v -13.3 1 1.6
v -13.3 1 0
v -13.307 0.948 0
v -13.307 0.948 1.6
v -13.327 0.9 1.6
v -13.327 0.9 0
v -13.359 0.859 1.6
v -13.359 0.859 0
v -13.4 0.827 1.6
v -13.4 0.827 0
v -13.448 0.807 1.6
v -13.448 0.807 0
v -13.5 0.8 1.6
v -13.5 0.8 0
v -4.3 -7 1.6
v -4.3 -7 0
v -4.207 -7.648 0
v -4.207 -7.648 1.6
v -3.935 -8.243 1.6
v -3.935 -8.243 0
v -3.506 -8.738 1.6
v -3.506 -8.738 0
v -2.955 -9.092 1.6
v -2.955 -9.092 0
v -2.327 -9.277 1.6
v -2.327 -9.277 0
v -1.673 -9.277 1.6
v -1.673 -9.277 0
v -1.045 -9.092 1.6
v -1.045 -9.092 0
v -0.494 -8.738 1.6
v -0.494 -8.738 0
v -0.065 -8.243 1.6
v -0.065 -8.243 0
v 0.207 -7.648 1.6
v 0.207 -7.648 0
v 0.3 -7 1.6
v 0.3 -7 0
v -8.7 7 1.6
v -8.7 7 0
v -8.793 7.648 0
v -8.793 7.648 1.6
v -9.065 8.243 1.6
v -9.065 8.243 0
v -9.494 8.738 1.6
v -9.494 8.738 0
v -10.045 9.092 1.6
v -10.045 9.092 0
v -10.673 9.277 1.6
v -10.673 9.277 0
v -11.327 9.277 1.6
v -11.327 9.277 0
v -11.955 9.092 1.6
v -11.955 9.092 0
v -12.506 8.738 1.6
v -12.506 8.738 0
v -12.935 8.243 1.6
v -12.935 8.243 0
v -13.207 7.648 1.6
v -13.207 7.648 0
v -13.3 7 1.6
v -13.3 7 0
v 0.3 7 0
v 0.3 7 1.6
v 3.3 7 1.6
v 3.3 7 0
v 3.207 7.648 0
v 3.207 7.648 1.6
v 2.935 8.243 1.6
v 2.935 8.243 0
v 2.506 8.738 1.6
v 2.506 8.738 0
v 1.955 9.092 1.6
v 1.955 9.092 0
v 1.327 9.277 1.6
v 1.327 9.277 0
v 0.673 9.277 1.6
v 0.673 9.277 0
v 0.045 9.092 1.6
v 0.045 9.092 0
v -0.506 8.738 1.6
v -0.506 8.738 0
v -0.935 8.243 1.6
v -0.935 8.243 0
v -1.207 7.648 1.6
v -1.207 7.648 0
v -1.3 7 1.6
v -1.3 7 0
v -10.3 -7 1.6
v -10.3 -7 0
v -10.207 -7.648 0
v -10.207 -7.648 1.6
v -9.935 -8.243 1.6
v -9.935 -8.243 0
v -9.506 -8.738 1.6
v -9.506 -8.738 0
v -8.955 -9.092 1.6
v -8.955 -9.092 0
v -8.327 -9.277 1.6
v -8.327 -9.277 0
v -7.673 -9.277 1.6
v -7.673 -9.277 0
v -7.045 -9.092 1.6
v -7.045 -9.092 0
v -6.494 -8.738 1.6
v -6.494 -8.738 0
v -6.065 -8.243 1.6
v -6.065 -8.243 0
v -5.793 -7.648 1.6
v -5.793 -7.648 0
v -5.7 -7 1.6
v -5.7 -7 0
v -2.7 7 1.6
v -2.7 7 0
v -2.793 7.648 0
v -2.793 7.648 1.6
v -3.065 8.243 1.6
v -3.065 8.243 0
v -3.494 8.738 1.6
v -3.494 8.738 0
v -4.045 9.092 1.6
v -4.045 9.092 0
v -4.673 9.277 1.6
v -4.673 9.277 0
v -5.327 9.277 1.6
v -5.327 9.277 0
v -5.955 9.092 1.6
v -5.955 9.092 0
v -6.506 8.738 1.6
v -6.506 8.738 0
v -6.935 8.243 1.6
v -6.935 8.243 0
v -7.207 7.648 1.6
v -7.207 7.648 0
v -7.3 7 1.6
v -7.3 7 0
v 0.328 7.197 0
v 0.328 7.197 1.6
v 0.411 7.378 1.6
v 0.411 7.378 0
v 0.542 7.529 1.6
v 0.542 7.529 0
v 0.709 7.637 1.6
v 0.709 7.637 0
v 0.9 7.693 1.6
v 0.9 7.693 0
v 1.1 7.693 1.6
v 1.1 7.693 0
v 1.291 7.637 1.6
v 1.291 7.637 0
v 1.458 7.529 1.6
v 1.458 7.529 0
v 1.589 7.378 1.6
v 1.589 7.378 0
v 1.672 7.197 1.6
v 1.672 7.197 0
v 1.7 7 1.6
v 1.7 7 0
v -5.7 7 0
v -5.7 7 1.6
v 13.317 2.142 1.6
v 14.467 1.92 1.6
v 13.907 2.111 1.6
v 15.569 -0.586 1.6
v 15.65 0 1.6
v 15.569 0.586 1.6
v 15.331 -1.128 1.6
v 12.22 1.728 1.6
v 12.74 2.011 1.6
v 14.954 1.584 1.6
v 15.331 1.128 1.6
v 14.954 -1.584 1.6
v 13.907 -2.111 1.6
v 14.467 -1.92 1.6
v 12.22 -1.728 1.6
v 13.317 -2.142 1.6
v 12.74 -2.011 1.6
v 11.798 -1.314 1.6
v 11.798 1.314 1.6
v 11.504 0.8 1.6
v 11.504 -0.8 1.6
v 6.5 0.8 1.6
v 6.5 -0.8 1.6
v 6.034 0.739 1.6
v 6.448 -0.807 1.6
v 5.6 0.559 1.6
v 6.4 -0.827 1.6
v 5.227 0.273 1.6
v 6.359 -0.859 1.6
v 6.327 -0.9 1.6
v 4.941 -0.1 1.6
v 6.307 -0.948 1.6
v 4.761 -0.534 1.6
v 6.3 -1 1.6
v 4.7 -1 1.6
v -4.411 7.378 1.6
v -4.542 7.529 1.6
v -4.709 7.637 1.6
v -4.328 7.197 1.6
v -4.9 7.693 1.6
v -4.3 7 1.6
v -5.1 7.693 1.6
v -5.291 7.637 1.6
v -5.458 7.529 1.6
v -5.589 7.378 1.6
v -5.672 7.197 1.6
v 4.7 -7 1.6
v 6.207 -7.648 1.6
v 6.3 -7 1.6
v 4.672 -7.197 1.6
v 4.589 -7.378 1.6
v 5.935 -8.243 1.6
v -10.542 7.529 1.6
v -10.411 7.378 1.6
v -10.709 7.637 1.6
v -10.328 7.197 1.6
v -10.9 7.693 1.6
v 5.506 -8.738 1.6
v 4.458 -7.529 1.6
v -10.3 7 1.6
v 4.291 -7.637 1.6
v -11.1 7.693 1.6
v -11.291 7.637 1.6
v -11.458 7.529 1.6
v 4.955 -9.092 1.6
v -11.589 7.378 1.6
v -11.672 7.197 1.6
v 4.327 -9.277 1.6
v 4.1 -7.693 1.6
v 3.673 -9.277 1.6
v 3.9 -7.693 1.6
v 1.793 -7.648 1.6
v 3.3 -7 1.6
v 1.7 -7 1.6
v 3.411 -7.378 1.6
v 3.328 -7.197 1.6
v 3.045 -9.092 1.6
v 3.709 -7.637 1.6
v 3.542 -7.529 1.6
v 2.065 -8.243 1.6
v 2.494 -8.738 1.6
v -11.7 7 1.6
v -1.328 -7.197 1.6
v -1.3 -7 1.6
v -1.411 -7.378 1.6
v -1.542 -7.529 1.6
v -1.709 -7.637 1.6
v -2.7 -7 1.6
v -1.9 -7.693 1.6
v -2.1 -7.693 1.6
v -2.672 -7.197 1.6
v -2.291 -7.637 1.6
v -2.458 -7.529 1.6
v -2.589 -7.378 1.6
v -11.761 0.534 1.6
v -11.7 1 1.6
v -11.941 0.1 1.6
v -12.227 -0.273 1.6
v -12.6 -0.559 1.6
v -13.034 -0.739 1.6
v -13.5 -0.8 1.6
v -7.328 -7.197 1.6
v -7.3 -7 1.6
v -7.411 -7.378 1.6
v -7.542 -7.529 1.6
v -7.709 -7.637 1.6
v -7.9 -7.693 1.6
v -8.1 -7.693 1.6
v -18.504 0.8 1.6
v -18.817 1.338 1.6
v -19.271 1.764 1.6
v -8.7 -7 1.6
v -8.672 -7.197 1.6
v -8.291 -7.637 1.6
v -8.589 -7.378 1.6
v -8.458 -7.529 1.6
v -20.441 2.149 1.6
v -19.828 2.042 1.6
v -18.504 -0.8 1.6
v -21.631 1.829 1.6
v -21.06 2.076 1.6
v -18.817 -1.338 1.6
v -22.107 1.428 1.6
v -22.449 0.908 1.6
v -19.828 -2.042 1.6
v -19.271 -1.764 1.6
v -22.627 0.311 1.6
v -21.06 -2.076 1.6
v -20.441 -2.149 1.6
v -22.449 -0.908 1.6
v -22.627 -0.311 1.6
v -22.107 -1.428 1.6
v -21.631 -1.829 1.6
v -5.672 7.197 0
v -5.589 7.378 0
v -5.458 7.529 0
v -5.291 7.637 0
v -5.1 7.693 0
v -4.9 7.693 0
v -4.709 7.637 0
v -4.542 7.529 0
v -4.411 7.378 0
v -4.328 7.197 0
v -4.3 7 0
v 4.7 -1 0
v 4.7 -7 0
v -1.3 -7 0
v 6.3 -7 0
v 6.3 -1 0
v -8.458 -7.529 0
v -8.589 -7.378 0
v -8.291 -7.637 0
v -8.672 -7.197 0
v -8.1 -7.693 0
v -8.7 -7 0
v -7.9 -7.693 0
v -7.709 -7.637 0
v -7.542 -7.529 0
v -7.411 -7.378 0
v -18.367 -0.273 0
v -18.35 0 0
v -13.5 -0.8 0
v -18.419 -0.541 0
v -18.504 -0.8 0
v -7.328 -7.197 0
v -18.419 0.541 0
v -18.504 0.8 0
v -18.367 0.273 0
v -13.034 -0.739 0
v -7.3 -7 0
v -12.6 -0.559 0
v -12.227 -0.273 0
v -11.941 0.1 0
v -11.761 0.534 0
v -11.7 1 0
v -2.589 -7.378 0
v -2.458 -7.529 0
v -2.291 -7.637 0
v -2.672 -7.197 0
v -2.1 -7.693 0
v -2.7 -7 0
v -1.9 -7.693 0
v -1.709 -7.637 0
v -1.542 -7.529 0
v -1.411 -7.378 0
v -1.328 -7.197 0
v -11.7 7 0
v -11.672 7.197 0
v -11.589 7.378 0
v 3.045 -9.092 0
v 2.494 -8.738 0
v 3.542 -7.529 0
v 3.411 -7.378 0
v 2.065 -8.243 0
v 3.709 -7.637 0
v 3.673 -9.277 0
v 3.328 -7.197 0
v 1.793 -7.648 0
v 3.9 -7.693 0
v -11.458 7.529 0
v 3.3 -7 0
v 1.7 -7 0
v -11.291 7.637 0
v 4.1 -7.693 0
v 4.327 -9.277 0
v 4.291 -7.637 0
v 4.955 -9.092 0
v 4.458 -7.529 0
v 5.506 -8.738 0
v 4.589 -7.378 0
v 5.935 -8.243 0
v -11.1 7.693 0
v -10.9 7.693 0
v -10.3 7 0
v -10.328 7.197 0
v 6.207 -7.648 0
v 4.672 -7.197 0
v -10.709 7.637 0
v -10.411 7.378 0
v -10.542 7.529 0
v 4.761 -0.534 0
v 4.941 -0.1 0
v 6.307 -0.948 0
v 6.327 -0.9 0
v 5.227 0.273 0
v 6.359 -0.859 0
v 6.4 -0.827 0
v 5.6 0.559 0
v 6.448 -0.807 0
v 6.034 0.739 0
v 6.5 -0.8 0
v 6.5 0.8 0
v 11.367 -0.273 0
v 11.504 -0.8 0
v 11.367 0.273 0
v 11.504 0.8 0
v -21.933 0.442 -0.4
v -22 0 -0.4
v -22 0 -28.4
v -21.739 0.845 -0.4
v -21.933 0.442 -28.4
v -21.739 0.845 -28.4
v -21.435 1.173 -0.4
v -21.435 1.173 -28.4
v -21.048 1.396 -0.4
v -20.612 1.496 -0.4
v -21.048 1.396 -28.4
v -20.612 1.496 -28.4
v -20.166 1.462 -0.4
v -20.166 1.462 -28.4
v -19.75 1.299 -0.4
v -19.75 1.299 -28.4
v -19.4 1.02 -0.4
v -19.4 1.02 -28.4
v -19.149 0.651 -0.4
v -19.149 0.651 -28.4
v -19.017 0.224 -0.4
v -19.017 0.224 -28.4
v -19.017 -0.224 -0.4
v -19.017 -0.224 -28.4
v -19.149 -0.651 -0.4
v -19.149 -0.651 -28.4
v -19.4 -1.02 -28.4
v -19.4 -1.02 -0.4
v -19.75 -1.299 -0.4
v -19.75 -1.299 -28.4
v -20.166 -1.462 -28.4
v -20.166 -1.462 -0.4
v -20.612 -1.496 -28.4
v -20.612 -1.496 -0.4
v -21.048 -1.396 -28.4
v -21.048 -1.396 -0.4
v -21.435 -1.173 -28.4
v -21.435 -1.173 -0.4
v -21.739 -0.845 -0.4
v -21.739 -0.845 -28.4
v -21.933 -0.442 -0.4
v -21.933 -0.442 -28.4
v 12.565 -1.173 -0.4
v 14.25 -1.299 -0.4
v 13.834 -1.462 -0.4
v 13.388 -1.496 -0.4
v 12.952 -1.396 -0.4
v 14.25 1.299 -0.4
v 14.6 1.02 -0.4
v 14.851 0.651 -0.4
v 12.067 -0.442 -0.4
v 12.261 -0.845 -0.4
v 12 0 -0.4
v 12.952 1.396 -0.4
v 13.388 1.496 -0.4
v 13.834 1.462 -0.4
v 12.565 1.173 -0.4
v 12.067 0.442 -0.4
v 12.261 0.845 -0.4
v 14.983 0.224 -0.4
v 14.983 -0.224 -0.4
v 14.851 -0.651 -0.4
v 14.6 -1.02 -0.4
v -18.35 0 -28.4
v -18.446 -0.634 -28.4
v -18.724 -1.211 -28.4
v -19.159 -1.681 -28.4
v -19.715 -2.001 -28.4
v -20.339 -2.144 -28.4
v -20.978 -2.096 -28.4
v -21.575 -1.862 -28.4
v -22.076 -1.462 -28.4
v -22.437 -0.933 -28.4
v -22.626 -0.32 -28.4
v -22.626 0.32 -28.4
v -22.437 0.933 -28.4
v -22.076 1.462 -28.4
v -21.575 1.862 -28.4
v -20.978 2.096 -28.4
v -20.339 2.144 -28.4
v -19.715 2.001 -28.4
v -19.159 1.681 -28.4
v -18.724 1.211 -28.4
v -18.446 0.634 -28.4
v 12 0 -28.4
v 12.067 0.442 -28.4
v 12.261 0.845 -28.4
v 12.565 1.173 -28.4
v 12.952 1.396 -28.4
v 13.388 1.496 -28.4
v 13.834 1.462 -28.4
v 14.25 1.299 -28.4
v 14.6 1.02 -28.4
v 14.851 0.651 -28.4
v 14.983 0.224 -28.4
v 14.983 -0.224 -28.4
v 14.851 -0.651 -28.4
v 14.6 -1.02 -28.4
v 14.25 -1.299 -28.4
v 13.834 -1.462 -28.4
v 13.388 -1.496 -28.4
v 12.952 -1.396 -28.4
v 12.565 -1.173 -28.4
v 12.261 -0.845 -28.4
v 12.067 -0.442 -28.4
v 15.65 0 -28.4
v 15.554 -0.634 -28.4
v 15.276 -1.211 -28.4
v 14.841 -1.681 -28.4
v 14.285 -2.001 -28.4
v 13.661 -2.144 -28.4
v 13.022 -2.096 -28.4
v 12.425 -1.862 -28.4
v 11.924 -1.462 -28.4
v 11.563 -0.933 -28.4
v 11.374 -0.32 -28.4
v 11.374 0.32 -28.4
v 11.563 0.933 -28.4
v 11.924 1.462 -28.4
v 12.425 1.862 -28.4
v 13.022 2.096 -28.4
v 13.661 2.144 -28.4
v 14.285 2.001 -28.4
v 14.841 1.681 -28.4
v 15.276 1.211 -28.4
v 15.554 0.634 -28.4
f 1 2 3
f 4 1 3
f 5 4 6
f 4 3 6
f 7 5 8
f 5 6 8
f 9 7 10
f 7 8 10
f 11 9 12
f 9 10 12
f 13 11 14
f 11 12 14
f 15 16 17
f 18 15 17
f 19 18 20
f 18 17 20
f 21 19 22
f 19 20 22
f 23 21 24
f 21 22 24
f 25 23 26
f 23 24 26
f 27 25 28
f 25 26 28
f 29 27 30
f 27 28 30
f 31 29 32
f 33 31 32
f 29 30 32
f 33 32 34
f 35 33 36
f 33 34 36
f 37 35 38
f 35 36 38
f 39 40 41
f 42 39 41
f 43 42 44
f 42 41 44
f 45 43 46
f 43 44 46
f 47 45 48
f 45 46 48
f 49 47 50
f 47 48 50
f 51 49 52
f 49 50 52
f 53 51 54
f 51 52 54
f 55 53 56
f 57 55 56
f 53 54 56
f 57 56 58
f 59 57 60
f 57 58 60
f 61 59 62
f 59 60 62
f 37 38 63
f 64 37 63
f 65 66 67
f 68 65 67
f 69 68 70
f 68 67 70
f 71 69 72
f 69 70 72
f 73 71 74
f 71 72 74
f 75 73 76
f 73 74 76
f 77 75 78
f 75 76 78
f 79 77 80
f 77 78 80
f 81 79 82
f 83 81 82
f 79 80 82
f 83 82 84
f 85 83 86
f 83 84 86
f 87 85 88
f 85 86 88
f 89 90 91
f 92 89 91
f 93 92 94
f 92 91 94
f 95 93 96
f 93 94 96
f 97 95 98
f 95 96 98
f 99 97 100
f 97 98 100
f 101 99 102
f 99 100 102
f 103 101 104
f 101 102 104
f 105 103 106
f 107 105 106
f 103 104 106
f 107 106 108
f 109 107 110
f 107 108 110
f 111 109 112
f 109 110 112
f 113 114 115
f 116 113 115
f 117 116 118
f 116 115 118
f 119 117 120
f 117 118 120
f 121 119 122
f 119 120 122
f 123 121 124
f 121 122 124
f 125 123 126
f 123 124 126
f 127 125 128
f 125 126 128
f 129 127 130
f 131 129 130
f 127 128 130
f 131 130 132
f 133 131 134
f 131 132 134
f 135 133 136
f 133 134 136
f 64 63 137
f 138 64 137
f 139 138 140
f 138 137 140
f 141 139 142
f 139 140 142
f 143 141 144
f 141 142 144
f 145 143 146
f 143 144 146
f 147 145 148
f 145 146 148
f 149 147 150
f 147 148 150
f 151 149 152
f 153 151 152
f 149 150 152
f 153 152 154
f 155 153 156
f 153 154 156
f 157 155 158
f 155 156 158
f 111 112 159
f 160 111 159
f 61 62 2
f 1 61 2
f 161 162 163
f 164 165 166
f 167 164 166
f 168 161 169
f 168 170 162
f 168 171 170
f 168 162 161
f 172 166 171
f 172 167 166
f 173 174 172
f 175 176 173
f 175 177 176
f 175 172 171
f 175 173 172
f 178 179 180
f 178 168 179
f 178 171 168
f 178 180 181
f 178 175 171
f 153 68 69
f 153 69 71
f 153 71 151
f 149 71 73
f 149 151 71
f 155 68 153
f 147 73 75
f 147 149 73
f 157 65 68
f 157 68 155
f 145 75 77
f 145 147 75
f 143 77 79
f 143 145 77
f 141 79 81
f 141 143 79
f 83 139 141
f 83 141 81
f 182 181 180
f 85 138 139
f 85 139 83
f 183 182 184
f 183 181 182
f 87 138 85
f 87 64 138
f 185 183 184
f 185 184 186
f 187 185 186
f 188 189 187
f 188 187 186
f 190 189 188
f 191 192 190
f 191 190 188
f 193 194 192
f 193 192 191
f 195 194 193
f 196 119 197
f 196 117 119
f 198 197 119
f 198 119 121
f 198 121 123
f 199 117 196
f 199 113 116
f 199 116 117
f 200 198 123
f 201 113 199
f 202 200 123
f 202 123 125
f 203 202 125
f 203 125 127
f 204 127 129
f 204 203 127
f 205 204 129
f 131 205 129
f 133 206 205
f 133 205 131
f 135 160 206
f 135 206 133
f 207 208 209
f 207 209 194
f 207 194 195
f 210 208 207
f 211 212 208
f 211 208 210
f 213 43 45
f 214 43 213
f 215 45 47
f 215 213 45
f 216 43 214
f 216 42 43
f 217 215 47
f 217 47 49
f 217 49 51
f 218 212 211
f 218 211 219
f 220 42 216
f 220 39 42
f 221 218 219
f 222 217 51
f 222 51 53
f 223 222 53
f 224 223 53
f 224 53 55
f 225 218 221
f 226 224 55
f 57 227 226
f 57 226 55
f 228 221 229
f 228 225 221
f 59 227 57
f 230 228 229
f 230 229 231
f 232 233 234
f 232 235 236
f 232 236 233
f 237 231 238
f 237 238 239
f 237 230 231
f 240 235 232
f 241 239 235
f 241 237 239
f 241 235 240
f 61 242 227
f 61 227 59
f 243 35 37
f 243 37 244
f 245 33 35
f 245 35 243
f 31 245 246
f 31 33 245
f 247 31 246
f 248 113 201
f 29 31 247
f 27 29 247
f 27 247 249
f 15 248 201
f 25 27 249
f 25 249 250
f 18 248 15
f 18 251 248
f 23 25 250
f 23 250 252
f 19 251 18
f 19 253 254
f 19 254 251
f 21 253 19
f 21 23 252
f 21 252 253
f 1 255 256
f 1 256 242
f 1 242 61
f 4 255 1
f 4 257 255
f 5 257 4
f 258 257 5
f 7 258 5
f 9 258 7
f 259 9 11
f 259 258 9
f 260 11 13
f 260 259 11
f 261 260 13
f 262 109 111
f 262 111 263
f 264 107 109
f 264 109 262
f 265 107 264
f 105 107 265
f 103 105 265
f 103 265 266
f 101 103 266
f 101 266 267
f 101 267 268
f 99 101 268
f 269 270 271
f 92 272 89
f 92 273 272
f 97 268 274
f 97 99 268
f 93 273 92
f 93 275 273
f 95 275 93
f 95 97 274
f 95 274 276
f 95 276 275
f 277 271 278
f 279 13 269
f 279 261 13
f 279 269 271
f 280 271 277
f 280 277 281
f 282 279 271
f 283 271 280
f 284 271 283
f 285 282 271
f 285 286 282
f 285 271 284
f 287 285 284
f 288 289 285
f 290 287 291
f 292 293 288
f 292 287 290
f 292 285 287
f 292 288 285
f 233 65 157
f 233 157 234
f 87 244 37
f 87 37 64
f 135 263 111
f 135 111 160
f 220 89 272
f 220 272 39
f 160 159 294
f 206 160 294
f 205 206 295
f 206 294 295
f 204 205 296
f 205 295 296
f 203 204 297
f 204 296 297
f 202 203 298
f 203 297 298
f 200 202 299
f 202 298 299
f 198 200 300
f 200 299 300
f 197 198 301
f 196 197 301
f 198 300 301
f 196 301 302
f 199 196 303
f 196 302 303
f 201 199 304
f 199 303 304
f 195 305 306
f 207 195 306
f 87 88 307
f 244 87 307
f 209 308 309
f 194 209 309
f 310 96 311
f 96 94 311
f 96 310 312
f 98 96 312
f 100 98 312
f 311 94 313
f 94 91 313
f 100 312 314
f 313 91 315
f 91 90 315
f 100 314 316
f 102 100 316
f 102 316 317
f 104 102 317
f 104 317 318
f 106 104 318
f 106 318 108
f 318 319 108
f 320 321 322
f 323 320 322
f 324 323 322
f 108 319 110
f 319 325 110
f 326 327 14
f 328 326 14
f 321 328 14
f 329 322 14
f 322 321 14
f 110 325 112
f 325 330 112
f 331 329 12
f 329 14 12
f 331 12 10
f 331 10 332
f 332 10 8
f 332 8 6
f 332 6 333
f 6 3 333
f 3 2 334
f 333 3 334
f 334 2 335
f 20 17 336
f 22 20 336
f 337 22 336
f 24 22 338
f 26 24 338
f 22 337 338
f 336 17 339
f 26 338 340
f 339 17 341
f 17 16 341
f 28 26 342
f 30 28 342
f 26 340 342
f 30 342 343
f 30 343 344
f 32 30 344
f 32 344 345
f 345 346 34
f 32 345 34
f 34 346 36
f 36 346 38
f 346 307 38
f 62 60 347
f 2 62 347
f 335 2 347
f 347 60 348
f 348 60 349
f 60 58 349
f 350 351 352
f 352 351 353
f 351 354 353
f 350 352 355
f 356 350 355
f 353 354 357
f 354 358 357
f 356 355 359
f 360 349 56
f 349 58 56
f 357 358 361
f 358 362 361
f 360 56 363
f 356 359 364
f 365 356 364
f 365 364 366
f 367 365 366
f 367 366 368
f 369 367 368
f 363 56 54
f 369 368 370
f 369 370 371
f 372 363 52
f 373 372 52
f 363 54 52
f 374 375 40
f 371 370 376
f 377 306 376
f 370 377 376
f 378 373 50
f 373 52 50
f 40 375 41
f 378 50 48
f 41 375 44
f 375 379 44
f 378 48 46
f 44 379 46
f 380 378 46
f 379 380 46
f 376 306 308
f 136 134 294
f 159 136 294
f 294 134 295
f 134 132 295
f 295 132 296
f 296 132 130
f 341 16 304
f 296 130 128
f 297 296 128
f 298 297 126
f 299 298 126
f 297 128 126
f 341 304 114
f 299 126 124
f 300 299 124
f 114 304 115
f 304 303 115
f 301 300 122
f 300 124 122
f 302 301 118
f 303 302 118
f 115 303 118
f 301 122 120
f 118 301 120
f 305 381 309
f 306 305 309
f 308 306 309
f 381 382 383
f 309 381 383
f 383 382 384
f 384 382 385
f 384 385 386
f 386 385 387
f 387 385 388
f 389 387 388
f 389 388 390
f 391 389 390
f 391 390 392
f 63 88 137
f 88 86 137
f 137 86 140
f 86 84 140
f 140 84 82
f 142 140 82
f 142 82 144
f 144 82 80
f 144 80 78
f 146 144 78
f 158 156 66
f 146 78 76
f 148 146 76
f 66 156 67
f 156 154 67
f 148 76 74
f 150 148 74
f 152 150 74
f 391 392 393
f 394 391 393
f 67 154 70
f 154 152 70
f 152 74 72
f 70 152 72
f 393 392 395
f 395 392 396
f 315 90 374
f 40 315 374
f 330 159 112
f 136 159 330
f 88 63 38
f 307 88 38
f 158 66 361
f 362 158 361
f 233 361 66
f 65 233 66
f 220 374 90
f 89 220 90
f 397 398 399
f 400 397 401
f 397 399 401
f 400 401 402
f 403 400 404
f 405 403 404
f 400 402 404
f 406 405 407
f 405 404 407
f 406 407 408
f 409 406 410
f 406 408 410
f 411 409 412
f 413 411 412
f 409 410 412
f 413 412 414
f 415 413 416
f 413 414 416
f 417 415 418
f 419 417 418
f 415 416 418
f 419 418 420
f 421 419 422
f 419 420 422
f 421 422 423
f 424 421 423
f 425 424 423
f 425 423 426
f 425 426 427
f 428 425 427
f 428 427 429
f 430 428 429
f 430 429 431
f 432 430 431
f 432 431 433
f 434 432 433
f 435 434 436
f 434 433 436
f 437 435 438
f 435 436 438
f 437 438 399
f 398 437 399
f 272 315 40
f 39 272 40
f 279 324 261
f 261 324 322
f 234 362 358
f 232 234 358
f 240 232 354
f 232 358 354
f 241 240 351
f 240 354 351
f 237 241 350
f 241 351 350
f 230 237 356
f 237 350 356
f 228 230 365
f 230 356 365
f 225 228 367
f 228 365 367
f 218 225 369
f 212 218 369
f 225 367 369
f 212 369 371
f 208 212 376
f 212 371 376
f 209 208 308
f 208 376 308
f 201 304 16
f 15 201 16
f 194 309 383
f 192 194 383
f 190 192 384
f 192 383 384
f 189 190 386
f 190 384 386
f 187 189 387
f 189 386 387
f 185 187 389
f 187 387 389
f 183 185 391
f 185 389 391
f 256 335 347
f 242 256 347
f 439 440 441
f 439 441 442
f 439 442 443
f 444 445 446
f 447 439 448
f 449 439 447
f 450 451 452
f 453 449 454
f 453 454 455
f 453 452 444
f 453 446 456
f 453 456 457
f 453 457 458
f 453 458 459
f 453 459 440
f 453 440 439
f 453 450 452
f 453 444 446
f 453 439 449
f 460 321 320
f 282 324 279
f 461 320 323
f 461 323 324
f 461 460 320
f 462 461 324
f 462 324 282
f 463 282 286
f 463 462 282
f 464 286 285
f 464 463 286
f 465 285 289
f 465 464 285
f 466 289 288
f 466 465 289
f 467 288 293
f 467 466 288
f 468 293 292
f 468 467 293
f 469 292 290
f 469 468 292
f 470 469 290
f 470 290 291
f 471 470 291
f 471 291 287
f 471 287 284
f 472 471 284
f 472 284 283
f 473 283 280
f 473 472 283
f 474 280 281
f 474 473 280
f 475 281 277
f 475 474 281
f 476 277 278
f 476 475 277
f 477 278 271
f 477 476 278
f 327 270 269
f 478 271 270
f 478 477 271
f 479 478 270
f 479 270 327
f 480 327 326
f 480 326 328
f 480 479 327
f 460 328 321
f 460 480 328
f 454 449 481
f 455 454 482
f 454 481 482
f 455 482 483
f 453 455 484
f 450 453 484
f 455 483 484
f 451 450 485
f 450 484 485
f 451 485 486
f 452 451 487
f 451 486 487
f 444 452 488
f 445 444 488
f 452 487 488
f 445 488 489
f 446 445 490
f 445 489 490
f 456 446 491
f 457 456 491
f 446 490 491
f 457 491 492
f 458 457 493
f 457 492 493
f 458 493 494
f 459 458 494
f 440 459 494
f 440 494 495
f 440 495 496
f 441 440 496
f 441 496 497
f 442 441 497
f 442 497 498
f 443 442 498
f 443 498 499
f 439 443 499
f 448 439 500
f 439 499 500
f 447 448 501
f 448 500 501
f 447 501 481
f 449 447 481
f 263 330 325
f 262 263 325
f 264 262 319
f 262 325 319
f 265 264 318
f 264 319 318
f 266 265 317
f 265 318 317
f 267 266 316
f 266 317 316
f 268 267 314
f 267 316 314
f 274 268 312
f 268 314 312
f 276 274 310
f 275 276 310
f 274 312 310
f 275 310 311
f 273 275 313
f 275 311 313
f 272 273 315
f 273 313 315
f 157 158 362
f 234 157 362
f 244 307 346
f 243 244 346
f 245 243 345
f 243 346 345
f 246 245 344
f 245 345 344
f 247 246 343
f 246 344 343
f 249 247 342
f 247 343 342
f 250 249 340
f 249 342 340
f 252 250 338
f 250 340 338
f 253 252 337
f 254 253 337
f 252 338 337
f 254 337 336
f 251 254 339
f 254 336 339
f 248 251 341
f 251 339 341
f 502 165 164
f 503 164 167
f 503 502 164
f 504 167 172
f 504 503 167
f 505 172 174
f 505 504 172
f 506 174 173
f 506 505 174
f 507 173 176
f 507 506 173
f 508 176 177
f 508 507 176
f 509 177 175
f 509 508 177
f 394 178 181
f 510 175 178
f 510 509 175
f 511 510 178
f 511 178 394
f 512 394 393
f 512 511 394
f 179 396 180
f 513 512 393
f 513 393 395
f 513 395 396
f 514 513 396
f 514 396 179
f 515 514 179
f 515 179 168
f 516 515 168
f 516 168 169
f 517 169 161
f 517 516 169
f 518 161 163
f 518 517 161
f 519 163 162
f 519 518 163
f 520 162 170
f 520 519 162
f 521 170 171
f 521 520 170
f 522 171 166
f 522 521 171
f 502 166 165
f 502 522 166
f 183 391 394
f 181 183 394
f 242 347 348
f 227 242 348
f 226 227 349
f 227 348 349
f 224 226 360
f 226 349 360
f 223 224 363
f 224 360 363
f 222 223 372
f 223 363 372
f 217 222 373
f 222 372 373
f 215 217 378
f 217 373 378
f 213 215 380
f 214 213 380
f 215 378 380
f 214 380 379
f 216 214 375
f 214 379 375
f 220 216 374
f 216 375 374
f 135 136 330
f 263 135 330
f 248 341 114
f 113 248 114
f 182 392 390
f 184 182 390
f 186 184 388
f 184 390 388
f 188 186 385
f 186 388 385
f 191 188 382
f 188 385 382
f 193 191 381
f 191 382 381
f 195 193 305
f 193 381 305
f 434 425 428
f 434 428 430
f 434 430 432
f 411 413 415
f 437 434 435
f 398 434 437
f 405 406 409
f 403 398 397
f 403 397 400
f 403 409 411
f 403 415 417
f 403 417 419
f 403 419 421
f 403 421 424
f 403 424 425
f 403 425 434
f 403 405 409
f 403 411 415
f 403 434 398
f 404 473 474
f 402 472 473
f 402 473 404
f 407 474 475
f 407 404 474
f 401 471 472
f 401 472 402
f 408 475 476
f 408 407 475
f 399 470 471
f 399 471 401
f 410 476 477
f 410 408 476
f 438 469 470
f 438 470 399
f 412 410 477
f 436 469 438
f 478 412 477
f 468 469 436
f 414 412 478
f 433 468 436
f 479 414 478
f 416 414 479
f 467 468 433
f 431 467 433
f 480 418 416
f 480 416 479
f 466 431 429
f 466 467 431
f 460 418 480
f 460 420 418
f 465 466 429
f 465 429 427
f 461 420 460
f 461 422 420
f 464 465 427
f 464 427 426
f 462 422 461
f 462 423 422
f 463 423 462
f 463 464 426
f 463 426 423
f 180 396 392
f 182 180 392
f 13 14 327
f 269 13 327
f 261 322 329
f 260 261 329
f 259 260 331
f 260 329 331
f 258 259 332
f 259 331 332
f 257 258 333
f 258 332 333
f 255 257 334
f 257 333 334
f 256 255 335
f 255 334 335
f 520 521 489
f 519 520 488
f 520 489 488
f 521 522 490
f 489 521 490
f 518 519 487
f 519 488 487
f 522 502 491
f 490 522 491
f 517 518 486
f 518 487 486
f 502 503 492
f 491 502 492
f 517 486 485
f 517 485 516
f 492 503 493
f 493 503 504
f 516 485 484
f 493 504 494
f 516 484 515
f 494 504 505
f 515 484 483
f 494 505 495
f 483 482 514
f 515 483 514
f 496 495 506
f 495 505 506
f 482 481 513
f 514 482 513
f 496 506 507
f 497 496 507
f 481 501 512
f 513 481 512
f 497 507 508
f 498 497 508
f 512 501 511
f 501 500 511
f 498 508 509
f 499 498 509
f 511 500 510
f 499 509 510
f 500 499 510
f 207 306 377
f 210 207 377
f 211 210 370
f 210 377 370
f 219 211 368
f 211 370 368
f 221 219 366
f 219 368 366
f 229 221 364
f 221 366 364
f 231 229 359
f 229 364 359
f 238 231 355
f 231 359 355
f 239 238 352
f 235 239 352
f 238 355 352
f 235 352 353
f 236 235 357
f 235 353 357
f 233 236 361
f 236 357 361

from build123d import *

# Parameters (mm, degrees)
BOSS_EXTRUDE1_DEPTH = 1.6
SKETCH3_W           = 2.15
SKETCH3_H           = 30
SKETCH4_W           = 2.15
SKETCH4_H           = 30
SKETCH5_R           = 1.5
CUT_EXTRUDE1_DEPTH  = 28


with BuildPart() as part:
    # Sketch2 → Boss-Extrude1 (new body)
    with BuildSketch(Plane.XY):
        with BuildLine():
            Line((-20.5, -0.8), (-13.5, -0.8))
            ThreePointArc((-13.5, -0.8), (-12.227207794, -0.272792206), (-11.7, 1))
            Line((-11.7, 1), (-11.7, 7))
            ThreePointArc((-11.7, 7), (-11, 7.7), (-10.3, 7))
            Line((-10.3, 7), (-10.3, 0))
            Line((-10.3, 0), (-10.3, -7))
            ThreePointArc((-10.3, -7), (-8, -9.3), (-5.7, -7))
            Line((-5.7, -7), (-5.7, 0))
            Line((-5.7, 0), (-5.7, 7))
            ThreePointArc((-5.7, 7), (-5, 7.7), (-4.3, 7))
            Line((-4.3, 7), (-4.3, 0))
            Line((-4.3, 0), (-4.3, -7))
            ThreePointArc((-4.3, -7), (-2, -9.3), (0.3, -7))
            Line((0.3, -7), (0.3, 0))
            Line((0.3, 0), (0.3, 7))
            ThreePointArc((0.3, 7), (1, 7.7), (1.7, 7))
            Line((1.7, 7), (1.7, 0))
            Line((1.7, 0), (1.7, -7))
            ThreePointArc((1.7, -7), (4, -9.3), (6.3, -7))
            Line((6.3, -7), (6.3, -1))
            ThreePointArc((6.3, -1), (6.358578644, -0.858578644), (6.5, -0.8))
            Line((6.5, -0.8), (13.5, -0.8))
            ThreePointArc((13.5, -0.8), (14.3, 0), (13.5, 0.8))
            Line((13.5, 0.8), (6.5, 0.8))
            ThreePointArc((6.5, 0.8), (5.227207794, 0.272792206), (4.7, -1))
            Line((4.7, -1), (4.7, -7))
            ThreePointArc((4.7, -7), (4, -7.7), (3.3, -7))
            Line((3.3, -7), (3.3, 0))
            Line((3.3, 0), (3.3, 7))
            ThreePointArc((3.3, 7), (1, 9.3), (-1.3, 7))
            Line((-1.3, 7), (-1.3, 0))
            Line((-1.3, 0), (-1.3, -7))
            ThreePointArc((-1.3, -7), (-2, -7.7), (-2.7, -7))
            Line((-2.7, -7), (-2.7, 0))
            Line((-2.7, 0), (-2.7, 7))
            ThreePointArc((-2.7, 7), (-5, 9.3), (-7.3, 7))
            Line((-7.3, 7), (-7.3, 0))
            Line((-7.3, 0), (-7.3, -7))
            ThreePointArc((-7.3, -7), (-8, -7.7), (-8.7, -7))
            Line((-8.7, -7), (-8.7, 0))
            Line((-8.7, 0), (-8.7, 7))
            ThreePointArc((-8.7, 7), (-11, 9.3), (-13.3, 7))
            Line((-13.3, 7), (-13.3, 1))
            ThreePointArc((-13.3, 1), (-13.358578644, 0.858578644), (-13.5, 0.8))
            Line((-13.5, 0.8), (-20.5, 0.8))
            ThreePointArc((-20.5, 0.8), (-21.3, 0), (-20.5, -0.8))
        make_face()
    extrude(amount=BOSS_EXTRUDE1_DEPTH)

    # Sketch3 → Revolve1 (revolve)
    with BuildSketch(Plane(origin=(0, 0, 0), x_dir=(1, 0, 0), z_dir=(0, 1, 0)), mode=Mode.PRIVATE) as revolve1_sk:
        with Locations((-21.575, 13.4)):
            Rectangle(SKETCH3_W, SKETCH3_H)
    revolve(revolve1_sk.sketch.rotate(Axis((-20.5, 0, 1.6), (0, 0, -1)), 180), axis=Axis((-20.5, 0, 1.6), (0, 0, -1)))

    # Sketch4 → Revolve2 (revolve)
    with BuildSketch(Plane(origin=(0, 0, 0), x_dir=(1, 0, 0), z_dir=(0, 1, 0))):
        with Locations((14.575, 13.4)):
            Rectangle(SKETCH4_W, SKETCH4_H)
    revolve(axis=Axis((13.5, 0, 1.6), (0, 0, -1)))

    # Sketch5 → Cut-Extrude1 (cut)
    with BuildSketch(Plane(origin=(0, 0, -28.4), x_dir=(-1, 0, 0), z_dir=(0, 0, -1))):
        with Locations((20.5, 0)):
            Circle(SKETCH5_R)
        with Locations((-13.5, 0)):
            Circle(SKETCH5_R)
    extrude(amount=-CUT_EXTRUDE1_DEPTH, mode=Mode.SUBTRACT)


solid = part.part
